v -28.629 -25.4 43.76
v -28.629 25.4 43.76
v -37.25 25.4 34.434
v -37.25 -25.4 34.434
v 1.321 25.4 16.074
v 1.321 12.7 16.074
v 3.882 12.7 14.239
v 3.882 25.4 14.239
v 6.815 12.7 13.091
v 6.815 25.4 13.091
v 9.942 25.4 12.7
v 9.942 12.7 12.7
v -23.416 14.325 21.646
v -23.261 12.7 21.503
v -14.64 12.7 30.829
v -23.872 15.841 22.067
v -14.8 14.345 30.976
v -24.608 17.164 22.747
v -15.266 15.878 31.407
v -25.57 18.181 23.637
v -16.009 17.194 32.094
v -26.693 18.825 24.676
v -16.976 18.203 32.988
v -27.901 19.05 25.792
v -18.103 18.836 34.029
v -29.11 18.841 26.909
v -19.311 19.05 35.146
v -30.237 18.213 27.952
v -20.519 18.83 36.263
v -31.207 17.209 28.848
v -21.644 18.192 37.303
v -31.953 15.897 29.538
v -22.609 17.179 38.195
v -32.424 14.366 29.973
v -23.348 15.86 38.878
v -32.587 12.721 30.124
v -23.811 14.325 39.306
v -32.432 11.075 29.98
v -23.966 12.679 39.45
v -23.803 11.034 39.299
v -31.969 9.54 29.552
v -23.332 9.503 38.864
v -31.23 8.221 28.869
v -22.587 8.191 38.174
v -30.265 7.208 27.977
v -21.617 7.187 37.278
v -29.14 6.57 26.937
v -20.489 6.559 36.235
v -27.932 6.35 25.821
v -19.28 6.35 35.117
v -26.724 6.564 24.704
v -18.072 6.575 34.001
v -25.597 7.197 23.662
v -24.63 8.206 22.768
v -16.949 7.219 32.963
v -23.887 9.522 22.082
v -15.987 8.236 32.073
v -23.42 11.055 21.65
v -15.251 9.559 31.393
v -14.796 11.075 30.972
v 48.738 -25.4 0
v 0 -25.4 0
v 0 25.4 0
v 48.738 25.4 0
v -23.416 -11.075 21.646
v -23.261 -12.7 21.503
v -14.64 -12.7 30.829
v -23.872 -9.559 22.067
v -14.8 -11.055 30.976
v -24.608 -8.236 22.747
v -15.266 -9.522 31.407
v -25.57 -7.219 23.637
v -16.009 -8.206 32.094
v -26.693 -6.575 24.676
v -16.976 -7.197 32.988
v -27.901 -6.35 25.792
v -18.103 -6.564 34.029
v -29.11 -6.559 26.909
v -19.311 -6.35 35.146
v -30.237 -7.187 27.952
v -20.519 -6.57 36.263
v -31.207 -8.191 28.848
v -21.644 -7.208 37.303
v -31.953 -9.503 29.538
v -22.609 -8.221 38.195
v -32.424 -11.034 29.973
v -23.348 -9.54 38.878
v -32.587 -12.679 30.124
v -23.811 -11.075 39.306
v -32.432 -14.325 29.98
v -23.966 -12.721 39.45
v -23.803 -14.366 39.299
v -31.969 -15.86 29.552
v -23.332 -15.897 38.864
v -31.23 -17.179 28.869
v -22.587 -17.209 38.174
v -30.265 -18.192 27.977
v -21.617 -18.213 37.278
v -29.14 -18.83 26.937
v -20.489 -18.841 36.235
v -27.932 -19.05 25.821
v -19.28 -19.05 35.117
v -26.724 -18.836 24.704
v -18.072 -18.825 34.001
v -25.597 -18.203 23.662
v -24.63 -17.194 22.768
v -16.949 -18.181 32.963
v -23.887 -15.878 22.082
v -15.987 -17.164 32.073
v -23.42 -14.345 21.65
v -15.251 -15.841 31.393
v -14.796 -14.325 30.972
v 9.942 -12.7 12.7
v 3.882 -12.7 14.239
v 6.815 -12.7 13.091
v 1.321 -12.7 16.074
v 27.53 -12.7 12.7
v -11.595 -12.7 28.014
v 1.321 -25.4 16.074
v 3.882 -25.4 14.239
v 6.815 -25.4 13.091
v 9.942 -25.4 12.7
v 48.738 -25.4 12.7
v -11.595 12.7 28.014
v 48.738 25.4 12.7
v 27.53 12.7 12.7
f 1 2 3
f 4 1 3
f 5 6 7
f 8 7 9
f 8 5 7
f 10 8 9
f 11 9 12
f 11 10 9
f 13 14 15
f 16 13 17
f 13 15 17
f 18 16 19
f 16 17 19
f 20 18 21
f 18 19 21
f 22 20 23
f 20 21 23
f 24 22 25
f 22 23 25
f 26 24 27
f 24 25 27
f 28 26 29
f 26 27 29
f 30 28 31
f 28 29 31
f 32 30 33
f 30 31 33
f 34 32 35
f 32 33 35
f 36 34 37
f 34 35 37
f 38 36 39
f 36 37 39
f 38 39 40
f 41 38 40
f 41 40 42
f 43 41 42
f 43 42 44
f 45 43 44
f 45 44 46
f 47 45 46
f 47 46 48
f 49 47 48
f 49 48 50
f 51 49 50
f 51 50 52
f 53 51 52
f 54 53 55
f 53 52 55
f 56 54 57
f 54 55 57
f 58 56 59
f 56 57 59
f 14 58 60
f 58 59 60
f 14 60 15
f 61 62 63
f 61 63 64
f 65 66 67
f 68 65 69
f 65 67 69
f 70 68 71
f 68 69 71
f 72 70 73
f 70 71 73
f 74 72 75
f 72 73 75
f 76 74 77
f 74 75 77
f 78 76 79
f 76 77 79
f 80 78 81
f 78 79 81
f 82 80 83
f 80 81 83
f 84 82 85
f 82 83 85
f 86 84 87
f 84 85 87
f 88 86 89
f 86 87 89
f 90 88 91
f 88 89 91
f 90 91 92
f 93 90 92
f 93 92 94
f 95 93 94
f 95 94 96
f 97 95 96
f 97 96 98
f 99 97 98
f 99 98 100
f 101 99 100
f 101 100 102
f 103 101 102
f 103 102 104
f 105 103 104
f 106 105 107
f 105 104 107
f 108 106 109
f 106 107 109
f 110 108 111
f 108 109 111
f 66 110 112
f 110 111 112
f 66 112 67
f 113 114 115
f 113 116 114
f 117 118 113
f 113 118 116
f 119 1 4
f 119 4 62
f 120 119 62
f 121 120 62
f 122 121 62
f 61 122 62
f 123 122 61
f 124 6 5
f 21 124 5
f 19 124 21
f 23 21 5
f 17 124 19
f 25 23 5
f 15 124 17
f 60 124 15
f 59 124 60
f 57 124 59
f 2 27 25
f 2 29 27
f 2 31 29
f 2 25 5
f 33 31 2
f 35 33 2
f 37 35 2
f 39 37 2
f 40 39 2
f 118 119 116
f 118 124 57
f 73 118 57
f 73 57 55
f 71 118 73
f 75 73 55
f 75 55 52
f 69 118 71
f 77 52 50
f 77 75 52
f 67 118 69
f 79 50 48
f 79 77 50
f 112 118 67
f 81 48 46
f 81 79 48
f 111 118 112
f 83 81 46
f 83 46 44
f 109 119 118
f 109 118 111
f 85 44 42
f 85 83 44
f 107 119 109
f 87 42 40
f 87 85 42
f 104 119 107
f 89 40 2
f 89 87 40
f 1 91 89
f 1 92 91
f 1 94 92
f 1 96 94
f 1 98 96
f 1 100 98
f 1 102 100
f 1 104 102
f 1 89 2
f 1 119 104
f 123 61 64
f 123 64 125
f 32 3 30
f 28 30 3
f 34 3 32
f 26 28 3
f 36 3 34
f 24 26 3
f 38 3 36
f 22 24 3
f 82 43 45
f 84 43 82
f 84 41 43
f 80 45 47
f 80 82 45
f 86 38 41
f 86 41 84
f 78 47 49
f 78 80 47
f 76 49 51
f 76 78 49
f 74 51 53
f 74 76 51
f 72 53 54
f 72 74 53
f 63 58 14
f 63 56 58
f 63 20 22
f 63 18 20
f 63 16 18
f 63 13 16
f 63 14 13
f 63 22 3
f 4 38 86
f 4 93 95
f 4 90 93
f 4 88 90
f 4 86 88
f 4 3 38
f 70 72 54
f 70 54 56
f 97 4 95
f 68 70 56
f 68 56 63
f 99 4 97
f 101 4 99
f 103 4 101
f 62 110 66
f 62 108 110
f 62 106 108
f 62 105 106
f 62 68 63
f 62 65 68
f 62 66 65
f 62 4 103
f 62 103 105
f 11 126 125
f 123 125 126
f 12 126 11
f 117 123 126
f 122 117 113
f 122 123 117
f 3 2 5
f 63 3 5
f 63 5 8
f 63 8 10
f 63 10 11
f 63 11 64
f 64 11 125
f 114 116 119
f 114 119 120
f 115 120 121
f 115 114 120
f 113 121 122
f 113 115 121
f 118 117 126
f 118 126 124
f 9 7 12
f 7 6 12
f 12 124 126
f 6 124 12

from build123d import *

# Parameters (mm, degrees)
F1_DEPTH = 25.4
F2_R     = 12.7
F4_DEPTH = 12.7
F5_R     = 6.35
F6_DEPTH = 25.4


with BuildPart() as f1:
    # F0 (on Front) → F1 (new body, symmetric)
    with BuildSketch(Plane.XZ):
        Polygon((-37.249966, 34.434151), (0, 0), (48.737777, 0), (48.737777, 12.7), (4.970752, 12.7), (-28.62911, 43.759968), align=None)
    extrude(amount=F1_DEPTH, both=True)

    # F2
    f2_edges = [f1.edges().sort_by_distance(p)[0] for p in [
        (4.970752, 0, 12.7),
    ]]
    fillet(f2_edges, radius=F2_R)

    # F3 (on Front) → F4 (join, symmetric)
    with BuildSketch(Plane.XZ):
        Polygon((4.970752, 12.7), (27.530322, 12.7), (-11.595107, 28.013606), align=None)
    extrude(amount=F4_DEPTH, both=True)

    # F5 (on face) → F6 (cut)
    with BuildSketch(Plane(origin=(8.620855, 0, 9.325816), x_dir=(0.734316, 0, -0.678808), z_dir=(0.678808, 0, 0.734316))):
        with Locations((-38.027416, -12.7)):
            Circle(F5_R)
        with Locations((-38.027416, 12.7)):
            Circle(F5_R)
    extrude(amount=-F6_DEPTH, mode=Mode.SUBTRACT)


solid = f1.part
